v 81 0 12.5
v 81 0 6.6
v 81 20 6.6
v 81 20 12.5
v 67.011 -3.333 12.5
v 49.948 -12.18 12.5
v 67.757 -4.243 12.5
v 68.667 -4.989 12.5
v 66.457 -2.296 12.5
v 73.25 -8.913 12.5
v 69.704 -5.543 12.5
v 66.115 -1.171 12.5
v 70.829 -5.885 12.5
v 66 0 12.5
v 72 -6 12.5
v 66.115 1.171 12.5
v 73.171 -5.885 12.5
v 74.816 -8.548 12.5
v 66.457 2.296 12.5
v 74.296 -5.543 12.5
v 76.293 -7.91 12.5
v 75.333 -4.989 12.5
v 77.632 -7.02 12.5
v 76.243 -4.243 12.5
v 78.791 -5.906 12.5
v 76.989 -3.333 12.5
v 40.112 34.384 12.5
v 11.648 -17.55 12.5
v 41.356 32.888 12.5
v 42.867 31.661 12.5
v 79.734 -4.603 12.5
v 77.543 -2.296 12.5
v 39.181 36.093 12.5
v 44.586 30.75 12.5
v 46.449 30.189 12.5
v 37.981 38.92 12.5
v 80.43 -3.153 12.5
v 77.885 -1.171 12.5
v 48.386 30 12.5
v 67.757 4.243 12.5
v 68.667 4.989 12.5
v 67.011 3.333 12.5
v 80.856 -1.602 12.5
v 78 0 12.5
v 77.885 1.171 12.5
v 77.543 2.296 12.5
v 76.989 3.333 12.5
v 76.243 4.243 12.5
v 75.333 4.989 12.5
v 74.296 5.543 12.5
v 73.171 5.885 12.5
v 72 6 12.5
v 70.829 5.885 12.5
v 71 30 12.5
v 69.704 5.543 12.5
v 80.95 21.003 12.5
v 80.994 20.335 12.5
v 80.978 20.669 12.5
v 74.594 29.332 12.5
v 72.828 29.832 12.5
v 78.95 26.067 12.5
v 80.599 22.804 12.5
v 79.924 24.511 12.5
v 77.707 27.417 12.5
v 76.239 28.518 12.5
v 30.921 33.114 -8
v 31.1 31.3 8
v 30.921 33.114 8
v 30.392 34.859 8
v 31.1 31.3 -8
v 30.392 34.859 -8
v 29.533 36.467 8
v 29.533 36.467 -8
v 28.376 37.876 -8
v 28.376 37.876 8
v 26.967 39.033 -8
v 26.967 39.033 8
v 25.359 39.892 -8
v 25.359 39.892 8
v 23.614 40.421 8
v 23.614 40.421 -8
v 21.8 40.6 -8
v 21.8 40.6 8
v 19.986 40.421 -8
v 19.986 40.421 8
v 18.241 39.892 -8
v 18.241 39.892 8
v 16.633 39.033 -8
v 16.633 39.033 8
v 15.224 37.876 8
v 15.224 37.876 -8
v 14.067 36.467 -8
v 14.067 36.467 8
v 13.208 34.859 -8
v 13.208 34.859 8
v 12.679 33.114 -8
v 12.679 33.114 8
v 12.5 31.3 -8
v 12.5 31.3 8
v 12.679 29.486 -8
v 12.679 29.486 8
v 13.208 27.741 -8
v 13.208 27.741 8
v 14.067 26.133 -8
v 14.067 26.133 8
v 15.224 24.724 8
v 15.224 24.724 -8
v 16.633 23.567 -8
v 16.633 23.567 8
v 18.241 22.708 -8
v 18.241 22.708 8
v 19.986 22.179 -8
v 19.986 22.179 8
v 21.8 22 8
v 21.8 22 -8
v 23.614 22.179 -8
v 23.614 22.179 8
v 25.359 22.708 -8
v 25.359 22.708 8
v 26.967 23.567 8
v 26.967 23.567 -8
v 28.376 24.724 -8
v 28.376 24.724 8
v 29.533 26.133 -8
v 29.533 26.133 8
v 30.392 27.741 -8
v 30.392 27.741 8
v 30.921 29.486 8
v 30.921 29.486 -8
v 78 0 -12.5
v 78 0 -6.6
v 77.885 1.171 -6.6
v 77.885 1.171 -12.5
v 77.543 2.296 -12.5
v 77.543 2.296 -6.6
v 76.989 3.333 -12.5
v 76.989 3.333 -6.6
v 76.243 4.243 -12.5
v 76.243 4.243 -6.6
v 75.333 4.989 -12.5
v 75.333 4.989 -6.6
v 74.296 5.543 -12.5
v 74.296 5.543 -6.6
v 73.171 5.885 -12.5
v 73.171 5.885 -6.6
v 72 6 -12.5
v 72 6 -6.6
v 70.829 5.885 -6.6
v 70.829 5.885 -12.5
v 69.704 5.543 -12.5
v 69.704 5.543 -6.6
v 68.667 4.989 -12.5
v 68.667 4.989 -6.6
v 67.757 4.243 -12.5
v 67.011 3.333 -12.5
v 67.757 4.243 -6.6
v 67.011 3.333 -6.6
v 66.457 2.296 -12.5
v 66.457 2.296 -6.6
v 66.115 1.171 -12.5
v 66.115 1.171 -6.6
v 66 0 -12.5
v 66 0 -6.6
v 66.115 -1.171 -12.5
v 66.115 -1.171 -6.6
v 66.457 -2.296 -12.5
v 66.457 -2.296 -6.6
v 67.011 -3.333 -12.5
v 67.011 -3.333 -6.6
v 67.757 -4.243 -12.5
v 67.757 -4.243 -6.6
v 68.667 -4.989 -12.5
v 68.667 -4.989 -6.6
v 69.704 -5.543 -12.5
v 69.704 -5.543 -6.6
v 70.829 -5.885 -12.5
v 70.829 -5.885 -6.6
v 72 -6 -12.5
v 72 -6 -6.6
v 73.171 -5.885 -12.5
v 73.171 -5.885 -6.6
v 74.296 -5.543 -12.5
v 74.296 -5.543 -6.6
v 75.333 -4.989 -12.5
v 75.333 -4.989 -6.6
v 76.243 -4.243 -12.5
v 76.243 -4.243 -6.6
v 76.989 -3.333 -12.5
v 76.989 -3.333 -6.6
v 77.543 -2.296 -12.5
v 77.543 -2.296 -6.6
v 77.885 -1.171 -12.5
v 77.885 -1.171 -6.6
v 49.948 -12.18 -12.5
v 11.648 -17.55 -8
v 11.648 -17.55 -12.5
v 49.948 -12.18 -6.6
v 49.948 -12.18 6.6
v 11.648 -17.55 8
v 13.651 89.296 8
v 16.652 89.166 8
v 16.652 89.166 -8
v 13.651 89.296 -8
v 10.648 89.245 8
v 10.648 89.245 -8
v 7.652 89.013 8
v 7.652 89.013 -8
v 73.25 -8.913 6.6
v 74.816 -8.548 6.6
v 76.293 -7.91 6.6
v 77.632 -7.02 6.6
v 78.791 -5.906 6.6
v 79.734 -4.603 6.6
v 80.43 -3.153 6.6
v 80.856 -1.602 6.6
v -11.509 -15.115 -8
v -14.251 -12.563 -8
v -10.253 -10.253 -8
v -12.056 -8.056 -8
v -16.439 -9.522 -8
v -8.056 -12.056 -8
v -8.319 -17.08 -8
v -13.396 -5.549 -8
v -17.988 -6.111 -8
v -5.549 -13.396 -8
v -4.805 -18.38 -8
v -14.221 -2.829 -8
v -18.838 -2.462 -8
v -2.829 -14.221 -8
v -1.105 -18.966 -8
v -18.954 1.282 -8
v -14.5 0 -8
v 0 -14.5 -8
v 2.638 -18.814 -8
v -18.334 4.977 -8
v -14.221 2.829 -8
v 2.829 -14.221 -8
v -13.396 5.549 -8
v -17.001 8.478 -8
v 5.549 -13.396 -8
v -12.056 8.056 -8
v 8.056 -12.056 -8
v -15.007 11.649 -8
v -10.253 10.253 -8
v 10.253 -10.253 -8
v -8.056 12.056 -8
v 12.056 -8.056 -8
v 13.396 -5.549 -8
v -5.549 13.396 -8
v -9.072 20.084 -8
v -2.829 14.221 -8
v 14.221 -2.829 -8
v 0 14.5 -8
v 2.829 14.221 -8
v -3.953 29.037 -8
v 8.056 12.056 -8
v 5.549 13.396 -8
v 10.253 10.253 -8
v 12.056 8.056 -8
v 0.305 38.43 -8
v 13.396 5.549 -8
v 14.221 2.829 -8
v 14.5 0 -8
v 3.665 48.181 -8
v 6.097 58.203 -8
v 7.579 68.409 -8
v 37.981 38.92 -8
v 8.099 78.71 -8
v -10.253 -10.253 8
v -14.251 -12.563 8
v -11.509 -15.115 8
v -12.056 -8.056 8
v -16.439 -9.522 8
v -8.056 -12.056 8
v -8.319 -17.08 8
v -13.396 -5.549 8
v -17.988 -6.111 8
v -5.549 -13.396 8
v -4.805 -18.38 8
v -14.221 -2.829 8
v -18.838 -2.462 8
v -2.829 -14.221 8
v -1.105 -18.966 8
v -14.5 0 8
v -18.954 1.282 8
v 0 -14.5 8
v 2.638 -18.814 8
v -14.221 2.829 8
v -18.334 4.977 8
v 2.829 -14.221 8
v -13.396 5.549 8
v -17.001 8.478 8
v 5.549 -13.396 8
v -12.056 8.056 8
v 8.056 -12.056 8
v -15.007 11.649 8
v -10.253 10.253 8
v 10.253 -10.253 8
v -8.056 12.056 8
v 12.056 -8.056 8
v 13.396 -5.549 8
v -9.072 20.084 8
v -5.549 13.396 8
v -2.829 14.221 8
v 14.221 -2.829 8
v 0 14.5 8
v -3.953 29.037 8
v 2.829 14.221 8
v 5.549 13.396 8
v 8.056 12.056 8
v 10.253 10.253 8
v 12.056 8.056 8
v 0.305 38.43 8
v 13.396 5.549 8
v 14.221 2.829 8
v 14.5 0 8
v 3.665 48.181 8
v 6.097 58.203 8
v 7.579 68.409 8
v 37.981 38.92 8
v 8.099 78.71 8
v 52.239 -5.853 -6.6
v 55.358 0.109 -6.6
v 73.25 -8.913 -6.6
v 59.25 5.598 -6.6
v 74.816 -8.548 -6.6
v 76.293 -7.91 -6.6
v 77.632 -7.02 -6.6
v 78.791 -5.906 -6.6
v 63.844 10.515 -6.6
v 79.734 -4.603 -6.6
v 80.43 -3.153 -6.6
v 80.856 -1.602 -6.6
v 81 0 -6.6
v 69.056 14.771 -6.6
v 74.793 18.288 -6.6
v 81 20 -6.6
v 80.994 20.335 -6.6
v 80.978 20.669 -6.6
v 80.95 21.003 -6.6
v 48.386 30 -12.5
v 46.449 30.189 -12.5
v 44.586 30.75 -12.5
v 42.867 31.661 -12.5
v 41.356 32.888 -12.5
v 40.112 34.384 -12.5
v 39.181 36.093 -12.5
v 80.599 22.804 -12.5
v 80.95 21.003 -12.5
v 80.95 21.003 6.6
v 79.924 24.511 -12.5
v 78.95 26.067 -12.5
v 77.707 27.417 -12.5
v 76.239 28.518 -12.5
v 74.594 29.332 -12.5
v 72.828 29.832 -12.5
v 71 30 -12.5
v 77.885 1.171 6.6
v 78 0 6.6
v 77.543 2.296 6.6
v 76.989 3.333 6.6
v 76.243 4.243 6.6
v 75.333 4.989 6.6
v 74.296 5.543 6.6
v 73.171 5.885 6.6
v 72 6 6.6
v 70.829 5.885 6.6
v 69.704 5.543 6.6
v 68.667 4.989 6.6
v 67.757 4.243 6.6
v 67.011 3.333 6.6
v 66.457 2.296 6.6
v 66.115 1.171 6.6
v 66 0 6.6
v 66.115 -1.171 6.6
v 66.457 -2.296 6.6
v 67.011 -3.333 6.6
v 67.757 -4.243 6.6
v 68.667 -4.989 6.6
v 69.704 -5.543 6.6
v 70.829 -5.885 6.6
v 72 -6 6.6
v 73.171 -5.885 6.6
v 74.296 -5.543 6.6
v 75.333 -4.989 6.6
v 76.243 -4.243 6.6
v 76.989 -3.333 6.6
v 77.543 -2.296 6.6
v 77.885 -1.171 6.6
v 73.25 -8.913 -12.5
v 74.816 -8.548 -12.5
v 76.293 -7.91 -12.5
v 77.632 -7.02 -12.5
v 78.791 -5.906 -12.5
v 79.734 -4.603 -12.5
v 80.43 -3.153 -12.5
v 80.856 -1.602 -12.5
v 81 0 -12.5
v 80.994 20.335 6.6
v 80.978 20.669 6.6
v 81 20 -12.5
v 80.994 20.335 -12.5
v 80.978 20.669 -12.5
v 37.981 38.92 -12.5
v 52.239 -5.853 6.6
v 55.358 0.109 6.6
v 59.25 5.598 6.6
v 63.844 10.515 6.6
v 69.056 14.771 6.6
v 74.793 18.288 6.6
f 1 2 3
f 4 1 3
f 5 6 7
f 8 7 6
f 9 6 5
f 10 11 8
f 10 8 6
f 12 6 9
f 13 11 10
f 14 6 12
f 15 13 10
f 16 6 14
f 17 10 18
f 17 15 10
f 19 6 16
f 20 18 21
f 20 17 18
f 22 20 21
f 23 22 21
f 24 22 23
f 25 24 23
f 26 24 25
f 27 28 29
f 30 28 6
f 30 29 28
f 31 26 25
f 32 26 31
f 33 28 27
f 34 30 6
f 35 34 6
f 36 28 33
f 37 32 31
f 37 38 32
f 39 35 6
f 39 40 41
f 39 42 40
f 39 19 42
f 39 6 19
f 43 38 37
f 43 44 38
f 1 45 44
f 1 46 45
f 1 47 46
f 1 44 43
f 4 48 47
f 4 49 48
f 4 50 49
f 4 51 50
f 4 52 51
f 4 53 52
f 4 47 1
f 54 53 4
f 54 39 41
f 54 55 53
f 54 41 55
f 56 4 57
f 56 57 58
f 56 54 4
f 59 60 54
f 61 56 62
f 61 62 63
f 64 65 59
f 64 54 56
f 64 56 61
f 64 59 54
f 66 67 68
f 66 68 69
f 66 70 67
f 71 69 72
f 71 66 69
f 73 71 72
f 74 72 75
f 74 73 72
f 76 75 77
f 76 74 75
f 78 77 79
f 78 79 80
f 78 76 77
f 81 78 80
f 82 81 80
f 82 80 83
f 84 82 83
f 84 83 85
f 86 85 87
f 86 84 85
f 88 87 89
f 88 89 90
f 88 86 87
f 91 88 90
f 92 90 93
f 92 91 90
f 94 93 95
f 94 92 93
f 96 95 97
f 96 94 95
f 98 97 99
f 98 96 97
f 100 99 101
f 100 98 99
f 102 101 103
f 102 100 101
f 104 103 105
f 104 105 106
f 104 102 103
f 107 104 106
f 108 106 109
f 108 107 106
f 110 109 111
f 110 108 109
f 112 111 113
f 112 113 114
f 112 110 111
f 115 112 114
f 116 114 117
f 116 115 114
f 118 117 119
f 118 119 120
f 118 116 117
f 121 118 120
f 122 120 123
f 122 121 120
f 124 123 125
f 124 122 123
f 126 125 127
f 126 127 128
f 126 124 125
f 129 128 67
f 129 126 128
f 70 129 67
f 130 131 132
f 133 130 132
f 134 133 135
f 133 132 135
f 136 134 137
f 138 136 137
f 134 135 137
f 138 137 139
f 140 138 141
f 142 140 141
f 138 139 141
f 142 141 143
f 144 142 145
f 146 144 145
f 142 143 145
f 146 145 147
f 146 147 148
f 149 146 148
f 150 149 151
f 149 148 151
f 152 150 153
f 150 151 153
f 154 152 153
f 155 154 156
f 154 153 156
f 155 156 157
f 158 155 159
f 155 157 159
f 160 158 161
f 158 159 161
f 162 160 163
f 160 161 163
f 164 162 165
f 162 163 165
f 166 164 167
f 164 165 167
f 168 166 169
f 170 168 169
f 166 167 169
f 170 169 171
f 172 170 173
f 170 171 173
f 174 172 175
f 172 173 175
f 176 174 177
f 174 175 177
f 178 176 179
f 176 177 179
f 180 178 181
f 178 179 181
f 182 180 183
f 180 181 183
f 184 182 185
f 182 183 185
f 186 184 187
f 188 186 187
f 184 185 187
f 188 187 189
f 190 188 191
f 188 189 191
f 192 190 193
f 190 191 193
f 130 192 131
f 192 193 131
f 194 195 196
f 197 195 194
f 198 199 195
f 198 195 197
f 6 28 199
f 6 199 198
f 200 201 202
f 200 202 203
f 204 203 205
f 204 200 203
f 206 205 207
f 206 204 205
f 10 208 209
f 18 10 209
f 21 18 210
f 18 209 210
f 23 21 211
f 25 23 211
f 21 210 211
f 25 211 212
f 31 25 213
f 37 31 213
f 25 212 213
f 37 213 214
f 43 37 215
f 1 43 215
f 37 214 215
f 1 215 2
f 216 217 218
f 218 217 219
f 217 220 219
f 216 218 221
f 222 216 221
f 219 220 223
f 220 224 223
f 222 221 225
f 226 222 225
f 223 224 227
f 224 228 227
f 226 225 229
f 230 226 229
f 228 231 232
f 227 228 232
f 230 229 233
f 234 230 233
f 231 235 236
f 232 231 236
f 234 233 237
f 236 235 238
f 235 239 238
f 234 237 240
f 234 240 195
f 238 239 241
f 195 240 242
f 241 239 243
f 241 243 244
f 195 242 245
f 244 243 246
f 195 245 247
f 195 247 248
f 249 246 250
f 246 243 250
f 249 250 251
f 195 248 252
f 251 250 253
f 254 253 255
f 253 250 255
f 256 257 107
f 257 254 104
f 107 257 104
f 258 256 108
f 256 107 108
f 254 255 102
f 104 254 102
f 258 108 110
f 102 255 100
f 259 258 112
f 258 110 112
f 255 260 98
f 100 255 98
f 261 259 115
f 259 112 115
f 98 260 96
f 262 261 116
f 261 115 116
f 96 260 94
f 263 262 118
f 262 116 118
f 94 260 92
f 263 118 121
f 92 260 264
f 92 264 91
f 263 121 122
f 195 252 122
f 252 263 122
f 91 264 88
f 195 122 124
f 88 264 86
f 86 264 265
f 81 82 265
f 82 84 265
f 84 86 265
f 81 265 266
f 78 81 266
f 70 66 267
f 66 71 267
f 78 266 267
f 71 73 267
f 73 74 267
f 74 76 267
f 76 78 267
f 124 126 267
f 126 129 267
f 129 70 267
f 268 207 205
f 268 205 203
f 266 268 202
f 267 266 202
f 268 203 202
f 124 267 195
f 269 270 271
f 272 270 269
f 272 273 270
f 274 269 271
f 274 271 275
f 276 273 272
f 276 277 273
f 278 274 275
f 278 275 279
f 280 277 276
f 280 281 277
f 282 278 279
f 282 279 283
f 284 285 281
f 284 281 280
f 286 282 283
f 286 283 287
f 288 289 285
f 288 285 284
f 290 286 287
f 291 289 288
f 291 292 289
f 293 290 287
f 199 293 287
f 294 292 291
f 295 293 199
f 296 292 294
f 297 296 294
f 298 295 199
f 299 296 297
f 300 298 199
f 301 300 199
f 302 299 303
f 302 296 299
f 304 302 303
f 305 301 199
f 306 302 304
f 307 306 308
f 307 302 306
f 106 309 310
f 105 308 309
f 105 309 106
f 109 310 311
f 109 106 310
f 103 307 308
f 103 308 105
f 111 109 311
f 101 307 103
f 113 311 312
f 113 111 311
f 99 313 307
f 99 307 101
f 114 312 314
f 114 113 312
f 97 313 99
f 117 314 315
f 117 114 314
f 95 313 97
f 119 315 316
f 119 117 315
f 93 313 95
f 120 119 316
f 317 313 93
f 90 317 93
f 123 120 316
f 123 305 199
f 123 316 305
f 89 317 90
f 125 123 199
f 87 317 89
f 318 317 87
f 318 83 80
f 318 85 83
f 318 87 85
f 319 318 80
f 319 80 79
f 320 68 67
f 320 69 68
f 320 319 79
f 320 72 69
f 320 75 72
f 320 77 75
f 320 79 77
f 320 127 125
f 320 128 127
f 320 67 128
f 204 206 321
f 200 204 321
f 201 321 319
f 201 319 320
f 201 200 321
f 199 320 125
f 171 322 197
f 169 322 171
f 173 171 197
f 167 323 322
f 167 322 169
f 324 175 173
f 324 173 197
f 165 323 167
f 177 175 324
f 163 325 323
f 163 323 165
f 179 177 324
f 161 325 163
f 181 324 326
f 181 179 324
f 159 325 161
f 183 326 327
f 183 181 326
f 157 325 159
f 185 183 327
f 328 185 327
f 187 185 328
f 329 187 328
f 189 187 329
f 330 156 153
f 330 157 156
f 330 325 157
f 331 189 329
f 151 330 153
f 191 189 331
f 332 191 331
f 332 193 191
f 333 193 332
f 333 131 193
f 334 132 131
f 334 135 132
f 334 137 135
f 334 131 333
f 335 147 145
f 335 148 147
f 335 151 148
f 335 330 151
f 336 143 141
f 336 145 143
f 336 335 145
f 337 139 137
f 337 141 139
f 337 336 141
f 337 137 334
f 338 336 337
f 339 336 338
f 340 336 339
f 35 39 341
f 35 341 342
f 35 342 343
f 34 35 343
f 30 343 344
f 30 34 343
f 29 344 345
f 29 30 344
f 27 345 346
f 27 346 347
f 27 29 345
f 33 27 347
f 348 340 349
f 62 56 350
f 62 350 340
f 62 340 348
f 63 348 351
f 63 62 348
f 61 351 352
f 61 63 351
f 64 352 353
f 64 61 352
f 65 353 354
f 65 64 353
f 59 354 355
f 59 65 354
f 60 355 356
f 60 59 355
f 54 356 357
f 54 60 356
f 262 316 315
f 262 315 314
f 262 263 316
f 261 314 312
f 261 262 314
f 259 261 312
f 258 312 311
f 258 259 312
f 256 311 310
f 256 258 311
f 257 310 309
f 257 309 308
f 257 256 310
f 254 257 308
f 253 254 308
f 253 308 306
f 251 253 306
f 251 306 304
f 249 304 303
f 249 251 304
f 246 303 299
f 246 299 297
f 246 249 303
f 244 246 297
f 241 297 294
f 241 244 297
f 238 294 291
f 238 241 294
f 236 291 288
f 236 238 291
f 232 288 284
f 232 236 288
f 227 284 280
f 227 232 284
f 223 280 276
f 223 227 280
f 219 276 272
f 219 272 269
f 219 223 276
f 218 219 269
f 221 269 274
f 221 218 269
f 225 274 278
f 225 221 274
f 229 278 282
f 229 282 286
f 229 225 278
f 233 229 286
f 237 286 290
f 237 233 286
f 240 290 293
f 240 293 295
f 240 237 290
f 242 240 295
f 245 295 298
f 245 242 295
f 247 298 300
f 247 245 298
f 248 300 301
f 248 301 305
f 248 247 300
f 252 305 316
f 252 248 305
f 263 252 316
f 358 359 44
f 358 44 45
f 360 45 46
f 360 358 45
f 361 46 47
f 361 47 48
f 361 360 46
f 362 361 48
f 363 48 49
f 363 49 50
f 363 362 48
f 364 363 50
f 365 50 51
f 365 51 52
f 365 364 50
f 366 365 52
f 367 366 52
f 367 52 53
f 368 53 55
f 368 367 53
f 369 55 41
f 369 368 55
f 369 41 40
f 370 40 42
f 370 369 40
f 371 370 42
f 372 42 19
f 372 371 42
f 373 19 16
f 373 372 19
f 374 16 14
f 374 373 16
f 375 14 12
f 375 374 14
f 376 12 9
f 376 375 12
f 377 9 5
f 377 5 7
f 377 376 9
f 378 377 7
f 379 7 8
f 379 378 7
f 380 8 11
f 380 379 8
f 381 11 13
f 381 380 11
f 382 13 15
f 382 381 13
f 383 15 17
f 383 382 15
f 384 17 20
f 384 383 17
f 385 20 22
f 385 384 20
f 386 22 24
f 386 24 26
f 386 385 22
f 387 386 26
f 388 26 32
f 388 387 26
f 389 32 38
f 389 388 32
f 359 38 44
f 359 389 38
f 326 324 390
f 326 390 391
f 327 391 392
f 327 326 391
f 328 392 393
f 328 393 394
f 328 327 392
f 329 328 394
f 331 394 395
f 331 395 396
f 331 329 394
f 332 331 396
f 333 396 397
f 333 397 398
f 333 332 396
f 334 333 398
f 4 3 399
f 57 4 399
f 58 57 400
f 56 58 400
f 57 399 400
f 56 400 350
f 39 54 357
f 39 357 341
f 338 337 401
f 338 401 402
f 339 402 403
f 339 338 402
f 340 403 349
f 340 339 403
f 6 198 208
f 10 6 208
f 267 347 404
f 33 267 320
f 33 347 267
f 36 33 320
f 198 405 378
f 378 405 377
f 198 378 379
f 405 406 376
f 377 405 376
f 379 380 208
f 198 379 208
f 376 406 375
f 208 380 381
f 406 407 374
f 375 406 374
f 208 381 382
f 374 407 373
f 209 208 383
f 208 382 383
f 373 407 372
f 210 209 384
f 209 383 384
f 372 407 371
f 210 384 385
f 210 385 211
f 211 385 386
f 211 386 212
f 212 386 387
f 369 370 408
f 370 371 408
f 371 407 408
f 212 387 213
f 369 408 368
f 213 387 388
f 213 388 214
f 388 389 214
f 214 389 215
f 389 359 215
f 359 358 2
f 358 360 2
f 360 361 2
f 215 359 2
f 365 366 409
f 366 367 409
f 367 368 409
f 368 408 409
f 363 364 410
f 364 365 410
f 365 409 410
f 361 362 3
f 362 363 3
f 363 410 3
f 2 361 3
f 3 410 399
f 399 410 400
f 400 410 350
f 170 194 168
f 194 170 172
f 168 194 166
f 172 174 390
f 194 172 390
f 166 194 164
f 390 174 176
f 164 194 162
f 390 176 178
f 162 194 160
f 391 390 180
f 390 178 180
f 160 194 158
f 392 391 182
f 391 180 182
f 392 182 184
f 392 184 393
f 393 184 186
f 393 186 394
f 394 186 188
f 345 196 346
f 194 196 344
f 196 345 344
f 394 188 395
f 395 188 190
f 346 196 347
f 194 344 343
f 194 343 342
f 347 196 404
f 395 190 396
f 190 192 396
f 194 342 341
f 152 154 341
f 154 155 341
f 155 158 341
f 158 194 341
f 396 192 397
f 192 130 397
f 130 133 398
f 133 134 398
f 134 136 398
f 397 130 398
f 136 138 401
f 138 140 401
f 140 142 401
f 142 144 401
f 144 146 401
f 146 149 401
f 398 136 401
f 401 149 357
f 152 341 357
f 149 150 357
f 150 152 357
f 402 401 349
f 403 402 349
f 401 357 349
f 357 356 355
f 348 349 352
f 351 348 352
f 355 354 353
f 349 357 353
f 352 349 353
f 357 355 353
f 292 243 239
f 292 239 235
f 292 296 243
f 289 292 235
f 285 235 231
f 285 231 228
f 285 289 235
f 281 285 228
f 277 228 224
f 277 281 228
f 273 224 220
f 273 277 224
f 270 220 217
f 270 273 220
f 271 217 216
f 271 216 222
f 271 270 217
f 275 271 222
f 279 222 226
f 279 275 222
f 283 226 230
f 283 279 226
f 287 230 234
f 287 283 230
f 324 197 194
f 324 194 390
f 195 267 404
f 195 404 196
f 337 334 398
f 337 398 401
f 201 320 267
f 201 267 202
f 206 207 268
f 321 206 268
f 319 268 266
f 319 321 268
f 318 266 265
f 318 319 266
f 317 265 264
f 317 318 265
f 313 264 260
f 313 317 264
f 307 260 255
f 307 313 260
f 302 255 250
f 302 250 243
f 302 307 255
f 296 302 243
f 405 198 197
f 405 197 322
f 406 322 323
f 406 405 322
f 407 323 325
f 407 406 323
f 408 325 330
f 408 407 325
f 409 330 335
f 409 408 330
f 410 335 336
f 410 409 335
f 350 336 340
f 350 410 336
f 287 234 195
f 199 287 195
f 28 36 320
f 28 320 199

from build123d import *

# Parameters (mm, degrees)
F0_R     = 14.5
F0_R_2   = 9.3
F1_DEPTH = 8
F2_DEPTH = 12.5
F0_R_3   = 6
F3_DEPTH = 6.6
F4_DEPTH = 5.9
F5_DEPTH = 5.9


with BuildPart() as f1:
    # F0 (on Top) → F1 (new body, symmetric)
    with BuildSketch(Plane.XY):
        with BuildLine():
            Line((2.6379834818, -18.8137083294), (11.6484677091, -17.5502940073))
            Line((11.6484677091, -17.5502940073), (37.9808631577, 38.9197102657))
            Line((37.9808631577, 38.9197102657), (16.6523997132, 89.1664213307))
            ThreePointArc((16.6523997132, 89.1664213307), (12.1489449291, 89.292756528), (7.6523997132, 89.0132092222))
            ThreePointArc((7.6523997132, 89.0132092222), (3.6651197911, 48.1806616582), (-15.0070128486, 11.6492121327))
            ThreePointArc((-15.0070128486, 11.6492121327), (-16.4391484767, -9.5220257988), (2.6379834818, -18.8137083294))
        make_face()
        Circle(F0_R, mode=Mode.SUBTRACT)
        with Locations((21.8, 31.3)):
            Circle(F0_R_2, mode=Mode.SUBTRACT)
    extrude(amount=F1_DEPTH, both=True)

    # F0 (on Top) → F2 (join, symmetric)
    with BuildSketch(Plane.XY):
        with BuildLine():
            Line((11.6484677091, -17.5502940073), (49.9478345026, -12.1801088639))
            ThreePointArc((49.9478345026, -12.1801088639), (61.4641714079, 8.1340479446), (80.9495714617, 21.0030093362))
            ThreePointArc((80.9495714617, 21.0030093362), (77.7070823253, 27.4172128648), (71, 30))
            Line((71, 30), (48.3859111453, 30))
            ThreePointArc((48.3859111453, 30), (42.8665412922, 31.6611417793), (39.1808626108, 36.0926887151))
            Line((39.1808626108, 36.0926887151), (37.9808631577, 38.9197102657))
            Line((37.9808631577, 38.9197102657), (11.6484677091, -17.5502940073))
        make_face()
    extrude(amount=F2_DEPTH, both=True)



with BuildPart() as f3:
    # F0 (on Top) → F3 (new body, symmetric)
    with BuildSketch(Plane.XY):
        with BuildLine():
            Line((49.9478345026, -12.1801088639), (73.2497189898, -8.9128111416))
            ThreePointArc((73.2497189898, -8.9128111416), (78.7914457558, -5.9056129695), (81, 0))
            Line((81, 0), (81, 20))
            ThreePointArc((81, 20), (80.9873849084, 20.5021381199), (80.9495714617, 21.0030093362))
            ThreePointArc((80.9495714617, 21.0030093362), (61.4641714079, 8.1340479446), (49.9478345026, -12.1801088639))
        make_face()
        with Locations((72, 0)):
            Circle(F0_R_3, mode=Mode.SUBTRACT)
    extrude(amount=F3_DEPTH, both=True)


with BuildPart() as f1_1:
    add(f1.part)
    # F4 (add, through all): a face of the model
    f4_faces = [f3.part.faces().sort_by_distance(p)[0] for p in [
        (61.7962542599, 7.8237954492, 6.6),
    ]]
    extrude(f4_faces, amount=F4_DEPTH)

    # F5 (add, through all): a face of the model
    f5_faces = [f3.part.faces().sort_by_distance(p)[0] for p in [
        (61.7962542599, 7.8237954492, -6.6),
    ]]
    extrude(f5_faces, amount=F5_DEPTH)

    # F6: cut F3
    add(f3.part, mode=Mode.SUBTRACT)


solid = f1_1.part
